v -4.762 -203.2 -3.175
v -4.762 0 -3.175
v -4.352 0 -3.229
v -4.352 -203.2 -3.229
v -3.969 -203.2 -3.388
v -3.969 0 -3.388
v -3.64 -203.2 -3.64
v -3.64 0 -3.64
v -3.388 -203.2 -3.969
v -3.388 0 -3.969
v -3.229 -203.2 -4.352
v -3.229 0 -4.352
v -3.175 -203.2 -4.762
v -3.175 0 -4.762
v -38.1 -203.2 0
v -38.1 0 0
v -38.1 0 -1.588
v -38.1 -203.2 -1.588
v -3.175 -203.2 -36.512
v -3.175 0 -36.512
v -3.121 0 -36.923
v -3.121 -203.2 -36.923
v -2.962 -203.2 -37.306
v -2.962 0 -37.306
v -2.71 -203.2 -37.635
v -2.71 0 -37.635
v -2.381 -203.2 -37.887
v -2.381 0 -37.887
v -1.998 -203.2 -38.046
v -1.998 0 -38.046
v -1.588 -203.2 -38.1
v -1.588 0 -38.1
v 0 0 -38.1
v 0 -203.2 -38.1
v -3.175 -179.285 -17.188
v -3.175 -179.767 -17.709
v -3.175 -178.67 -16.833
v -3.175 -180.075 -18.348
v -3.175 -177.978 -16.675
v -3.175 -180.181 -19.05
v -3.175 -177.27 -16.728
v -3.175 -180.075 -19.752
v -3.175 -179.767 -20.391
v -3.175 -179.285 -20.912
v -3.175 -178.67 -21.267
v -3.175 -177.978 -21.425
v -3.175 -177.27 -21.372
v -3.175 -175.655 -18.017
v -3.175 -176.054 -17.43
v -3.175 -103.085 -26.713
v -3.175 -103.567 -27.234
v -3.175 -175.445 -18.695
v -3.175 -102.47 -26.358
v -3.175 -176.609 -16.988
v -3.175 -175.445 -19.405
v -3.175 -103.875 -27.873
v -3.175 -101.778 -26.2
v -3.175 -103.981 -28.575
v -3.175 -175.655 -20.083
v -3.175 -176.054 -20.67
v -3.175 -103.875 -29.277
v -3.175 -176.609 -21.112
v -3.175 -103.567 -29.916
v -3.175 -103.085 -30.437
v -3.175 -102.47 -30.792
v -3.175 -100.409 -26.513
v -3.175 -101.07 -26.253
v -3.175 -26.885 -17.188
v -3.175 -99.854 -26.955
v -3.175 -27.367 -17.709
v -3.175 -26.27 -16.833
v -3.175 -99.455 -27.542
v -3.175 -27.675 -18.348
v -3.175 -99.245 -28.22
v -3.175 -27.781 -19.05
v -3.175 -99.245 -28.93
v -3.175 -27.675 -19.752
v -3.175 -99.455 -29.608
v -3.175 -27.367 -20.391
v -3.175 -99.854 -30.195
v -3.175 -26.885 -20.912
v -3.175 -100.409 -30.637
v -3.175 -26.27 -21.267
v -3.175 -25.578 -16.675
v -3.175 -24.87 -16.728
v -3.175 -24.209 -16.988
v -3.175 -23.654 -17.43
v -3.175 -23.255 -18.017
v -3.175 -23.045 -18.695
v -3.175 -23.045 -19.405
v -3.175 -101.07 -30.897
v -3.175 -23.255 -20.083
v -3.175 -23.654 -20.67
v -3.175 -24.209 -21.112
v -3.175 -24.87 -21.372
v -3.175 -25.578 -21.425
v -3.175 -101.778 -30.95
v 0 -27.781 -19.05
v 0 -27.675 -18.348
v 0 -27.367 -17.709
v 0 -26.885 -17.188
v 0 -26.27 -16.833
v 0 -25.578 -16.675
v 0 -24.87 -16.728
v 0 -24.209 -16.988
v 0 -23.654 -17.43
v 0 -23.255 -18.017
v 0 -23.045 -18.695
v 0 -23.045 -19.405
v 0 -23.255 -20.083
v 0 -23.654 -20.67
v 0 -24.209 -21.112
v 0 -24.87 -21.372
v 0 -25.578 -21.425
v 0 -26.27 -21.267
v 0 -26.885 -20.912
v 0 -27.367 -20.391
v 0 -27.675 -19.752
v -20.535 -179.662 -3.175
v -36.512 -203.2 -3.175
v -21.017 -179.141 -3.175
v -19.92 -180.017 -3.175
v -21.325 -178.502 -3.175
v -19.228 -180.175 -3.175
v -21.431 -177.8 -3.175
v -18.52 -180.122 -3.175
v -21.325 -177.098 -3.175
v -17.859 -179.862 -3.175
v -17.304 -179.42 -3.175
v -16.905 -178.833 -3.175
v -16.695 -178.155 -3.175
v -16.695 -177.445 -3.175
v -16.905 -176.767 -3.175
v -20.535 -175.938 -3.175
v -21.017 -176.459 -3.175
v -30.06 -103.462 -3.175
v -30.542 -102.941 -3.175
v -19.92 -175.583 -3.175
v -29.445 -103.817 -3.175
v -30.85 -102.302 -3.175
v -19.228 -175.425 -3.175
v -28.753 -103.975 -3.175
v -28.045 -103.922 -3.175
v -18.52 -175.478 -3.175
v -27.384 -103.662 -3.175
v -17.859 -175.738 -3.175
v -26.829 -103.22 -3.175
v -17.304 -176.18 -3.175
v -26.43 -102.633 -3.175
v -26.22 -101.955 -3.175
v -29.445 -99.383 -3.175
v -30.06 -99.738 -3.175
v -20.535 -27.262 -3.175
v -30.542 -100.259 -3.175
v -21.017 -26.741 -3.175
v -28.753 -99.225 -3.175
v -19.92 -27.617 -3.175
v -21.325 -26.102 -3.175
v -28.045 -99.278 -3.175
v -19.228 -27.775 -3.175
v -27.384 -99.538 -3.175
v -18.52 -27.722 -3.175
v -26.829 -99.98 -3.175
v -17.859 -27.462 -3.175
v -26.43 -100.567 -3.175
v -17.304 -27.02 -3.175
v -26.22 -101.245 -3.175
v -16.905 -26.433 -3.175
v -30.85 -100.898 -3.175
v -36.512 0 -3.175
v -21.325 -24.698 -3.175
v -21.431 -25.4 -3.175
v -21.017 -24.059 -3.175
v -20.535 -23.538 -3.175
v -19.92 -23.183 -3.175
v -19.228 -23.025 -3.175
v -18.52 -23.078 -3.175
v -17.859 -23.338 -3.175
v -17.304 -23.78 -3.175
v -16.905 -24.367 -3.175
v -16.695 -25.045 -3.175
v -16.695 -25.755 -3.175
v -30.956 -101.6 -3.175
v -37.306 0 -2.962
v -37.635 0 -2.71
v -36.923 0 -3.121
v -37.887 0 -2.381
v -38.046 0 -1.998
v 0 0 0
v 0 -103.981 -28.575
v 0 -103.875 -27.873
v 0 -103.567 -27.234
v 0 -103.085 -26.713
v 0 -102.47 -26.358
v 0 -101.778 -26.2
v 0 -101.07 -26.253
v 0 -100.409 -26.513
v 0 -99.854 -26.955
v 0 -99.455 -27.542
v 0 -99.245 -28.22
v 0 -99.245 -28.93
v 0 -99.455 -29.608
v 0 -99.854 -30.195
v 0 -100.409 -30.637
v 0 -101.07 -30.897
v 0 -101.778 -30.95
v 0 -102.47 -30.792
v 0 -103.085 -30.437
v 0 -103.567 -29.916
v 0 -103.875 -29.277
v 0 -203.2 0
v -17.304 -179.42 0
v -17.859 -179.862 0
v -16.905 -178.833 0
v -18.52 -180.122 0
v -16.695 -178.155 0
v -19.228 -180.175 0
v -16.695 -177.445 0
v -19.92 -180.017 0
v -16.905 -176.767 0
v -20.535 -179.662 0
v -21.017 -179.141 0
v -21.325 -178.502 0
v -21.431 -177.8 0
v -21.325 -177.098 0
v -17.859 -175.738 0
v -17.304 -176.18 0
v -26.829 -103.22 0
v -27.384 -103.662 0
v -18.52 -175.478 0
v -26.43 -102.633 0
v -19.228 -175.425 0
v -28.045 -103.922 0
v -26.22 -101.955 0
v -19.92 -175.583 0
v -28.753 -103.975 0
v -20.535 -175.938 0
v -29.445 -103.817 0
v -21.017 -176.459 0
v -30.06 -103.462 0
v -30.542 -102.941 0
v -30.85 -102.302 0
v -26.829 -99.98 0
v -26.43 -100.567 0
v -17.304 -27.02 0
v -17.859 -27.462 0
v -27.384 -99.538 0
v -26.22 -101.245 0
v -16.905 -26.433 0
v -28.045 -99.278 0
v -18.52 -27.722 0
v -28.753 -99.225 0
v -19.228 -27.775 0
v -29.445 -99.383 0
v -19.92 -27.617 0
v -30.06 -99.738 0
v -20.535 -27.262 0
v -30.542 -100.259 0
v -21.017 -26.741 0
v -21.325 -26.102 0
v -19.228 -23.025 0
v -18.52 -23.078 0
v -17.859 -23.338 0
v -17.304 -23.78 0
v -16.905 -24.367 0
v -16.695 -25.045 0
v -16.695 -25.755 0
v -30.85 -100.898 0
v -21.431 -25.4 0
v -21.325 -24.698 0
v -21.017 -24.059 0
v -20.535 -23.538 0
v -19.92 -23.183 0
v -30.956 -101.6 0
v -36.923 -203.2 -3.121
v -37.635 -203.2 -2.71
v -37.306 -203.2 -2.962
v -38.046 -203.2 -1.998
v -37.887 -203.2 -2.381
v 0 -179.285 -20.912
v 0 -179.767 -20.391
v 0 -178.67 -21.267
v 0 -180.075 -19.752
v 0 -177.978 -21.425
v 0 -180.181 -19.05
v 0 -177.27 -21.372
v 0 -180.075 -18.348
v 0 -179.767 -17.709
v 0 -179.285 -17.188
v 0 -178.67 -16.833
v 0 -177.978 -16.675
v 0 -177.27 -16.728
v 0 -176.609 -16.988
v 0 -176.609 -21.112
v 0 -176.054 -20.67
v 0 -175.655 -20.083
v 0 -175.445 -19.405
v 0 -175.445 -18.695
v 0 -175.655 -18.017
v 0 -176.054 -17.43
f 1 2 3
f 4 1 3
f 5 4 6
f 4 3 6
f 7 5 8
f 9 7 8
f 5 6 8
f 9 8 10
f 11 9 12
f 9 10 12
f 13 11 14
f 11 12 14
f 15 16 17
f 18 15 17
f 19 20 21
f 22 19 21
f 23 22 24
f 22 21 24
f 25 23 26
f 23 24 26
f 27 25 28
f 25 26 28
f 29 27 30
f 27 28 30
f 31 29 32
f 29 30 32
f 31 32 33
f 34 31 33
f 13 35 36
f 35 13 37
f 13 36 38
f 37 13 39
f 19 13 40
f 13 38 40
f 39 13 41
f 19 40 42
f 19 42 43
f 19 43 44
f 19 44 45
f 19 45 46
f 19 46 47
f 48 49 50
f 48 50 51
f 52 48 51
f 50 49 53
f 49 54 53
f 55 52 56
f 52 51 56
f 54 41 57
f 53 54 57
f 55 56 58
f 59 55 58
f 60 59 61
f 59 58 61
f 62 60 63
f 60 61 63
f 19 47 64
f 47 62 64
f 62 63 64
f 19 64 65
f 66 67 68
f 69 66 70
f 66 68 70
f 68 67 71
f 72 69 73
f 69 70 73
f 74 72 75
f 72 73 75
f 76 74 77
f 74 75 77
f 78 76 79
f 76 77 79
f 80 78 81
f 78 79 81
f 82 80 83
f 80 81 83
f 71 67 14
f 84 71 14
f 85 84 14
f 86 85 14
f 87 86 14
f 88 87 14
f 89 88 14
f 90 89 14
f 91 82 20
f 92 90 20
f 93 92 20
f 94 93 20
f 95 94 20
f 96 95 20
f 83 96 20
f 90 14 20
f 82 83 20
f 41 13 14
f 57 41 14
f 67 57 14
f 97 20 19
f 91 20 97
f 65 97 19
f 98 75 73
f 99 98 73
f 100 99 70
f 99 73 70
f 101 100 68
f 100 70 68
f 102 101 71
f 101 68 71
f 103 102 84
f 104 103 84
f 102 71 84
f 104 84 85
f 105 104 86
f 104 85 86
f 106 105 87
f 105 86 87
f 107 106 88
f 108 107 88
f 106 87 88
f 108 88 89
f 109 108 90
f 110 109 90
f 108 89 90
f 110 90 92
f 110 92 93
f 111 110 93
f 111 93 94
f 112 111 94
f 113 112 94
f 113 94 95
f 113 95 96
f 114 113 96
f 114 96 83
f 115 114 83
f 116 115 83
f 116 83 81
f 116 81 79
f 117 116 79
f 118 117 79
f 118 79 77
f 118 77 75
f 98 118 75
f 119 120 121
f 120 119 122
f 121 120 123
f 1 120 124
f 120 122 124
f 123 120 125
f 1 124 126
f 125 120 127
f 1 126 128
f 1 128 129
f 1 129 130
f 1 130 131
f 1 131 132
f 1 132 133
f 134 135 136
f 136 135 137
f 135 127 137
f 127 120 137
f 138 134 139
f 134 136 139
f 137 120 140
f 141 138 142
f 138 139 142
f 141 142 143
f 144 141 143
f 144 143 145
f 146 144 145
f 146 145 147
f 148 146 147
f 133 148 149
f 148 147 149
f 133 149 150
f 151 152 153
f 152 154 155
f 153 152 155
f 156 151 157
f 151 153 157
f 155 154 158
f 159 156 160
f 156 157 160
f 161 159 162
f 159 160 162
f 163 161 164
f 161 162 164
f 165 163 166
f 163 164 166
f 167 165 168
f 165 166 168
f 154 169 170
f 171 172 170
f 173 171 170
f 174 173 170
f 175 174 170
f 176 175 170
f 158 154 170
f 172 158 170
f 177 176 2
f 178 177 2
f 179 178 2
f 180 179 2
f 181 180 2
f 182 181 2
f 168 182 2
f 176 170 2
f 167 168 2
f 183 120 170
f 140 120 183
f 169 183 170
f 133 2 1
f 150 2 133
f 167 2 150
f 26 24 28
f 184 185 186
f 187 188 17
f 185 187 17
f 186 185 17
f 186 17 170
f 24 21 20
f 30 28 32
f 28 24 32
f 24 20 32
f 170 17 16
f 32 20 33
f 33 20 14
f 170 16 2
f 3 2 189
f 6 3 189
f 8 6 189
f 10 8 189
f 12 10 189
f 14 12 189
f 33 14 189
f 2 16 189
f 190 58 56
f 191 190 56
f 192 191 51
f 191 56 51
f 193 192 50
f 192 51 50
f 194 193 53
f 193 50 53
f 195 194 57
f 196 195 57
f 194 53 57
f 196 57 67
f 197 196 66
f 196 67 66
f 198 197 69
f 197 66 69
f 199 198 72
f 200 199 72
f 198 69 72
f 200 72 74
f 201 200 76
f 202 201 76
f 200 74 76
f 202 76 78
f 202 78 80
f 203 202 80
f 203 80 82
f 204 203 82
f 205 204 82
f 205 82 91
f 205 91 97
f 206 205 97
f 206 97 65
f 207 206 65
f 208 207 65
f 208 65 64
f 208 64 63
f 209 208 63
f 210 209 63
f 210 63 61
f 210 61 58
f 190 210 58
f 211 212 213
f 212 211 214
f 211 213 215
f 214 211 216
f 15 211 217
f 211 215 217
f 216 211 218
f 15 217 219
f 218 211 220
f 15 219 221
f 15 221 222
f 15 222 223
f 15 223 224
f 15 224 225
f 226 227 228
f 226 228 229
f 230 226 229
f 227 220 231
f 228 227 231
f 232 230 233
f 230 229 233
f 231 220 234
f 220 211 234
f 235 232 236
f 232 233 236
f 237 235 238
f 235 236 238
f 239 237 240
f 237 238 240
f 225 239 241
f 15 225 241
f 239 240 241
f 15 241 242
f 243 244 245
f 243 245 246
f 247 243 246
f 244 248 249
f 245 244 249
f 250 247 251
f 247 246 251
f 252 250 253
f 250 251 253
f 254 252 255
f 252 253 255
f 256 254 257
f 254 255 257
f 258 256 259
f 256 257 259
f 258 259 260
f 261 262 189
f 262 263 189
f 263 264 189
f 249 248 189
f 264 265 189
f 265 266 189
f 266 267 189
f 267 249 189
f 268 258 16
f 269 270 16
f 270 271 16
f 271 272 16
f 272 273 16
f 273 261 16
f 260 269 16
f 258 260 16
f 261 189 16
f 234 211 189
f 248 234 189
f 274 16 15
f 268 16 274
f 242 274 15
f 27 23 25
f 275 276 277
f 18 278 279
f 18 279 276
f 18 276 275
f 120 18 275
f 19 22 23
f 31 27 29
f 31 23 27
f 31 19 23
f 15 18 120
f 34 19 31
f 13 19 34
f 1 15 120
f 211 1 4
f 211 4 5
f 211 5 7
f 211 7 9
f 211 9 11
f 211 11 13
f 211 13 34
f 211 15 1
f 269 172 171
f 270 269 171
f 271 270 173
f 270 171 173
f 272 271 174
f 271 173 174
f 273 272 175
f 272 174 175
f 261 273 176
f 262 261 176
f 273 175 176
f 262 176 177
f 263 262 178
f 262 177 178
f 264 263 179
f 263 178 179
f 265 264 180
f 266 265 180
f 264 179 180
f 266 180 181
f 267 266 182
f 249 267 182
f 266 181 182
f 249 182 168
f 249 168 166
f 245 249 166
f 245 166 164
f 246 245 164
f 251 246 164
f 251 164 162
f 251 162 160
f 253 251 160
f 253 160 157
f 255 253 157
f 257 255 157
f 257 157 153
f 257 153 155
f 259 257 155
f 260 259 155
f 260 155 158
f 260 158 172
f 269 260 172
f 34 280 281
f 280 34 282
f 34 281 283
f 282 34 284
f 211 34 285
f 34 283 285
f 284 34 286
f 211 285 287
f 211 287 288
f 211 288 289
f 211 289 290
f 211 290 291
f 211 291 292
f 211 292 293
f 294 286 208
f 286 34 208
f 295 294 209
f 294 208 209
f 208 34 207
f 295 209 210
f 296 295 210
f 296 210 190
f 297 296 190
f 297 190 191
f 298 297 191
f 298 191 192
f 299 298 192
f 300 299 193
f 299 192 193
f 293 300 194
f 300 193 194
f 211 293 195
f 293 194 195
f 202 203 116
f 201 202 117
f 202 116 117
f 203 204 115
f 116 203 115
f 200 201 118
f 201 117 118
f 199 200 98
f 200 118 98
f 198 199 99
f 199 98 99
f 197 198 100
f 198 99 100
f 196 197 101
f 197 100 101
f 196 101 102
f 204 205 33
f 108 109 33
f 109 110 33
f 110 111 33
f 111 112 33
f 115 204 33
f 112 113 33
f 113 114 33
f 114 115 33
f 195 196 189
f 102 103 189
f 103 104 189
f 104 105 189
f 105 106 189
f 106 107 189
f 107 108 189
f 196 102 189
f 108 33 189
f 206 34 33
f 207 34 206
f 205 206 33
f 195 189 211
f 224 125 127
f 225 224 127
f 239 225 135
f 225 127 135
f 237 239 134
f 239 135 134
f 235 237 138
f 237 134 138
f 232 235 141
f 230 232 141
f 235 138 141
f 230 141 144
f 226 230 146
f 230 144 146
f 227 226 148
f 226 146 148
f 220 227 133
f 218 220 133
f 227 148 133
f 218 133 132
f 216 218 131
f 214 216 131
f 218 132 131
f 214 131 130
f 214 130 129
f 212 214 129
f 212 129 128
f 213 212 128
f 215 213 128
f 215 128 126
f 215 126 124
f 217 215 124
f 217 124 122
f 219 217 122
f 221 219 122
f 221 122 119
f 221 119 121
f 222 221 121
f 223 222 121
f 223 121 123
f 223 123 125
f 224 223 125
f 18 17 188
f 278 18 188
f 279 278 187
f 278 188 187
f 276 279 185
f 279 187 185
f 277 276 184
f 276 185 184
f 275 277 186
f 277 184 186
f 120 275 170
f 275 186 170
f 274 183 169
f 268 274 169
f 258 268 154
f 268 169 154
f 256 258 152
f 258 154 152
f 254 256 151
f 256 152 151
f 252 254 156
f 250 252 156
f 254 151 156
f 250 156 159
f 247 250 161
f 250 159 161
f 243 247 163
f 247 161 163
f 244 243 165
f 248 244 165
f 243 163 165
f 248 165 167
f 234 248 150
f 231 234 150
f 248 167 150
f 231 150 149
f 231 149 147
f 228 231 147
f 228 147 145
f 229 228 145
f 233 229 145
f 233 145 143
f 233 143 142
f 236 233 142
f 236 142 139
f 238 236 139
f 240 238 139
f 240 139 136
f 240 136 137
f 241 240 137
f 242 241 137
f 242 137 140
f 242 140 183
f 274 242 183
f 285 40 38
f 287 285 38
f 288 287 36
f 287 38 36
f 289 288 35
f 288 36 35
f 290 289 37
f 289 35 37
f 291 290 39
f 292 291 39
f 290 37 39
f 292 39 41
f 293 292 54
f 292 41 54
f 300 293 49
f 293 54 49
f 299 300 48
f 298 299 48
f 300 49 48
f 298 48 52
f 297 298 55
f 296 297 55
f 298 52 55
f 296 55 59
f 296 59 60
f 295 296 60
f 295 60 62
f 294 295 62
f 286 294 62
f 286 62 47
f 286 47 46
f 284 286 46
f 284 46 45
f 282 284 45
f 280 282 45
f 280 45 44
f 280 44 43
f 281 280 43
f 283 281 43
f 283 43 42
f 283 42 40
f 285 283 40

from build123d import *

# Parameters (mm, degrees)
F1_DEPTH = 203.2
F3_D     = 4.7625
F5_D     = 4.7625


with BuildPart() as f1:
    # F0 (on Front) → F1 (new body)
    with BuildSketch(Plane.XZ):
        with BuildLine():
            Line((0, -38.1), (0, 0))
            Line((0, 0), (-38.1, 0))
            Line((-38.1, 0), (-38.1, -1.5875))
            ThreePointArc((-38.1, -1.5875), (-37.635032, -2.710032), (-36.5125, -3.175))
            Line((-36.5125, -3.175), (-4.7625, -3.175))
            ThreePointArc((-4.7625, -3.175), (-3.639968, -3.639968), (-3.175, -4.7625))
            Line((-3.175, -4.7625), (-3.175, -36.5125))
            ThreePointArc((-3.175, -36.5125), (-2.710032, -37.635032), (-1.5875, -38.1))
            Line((-1.5875, -38.1), (0, -38.1))
        make_face()
    extrude(amount=F1_DEPTH)

    # F3 (through all)
    with Locations(Plane.XY):
        with Locations((-19.05, -177.8), (-28.575, -101.6), (-19.05, -25.4)):
            Hole(F3_D / 2)

    # F5 (through all)
    with Locations(Plane.YZ):
        with Locations((-25.4, -19.05), (-101.6, -28.575), (-177.8, -19.05)):
            Hole(F5_D / 2)


solid = f1.part
